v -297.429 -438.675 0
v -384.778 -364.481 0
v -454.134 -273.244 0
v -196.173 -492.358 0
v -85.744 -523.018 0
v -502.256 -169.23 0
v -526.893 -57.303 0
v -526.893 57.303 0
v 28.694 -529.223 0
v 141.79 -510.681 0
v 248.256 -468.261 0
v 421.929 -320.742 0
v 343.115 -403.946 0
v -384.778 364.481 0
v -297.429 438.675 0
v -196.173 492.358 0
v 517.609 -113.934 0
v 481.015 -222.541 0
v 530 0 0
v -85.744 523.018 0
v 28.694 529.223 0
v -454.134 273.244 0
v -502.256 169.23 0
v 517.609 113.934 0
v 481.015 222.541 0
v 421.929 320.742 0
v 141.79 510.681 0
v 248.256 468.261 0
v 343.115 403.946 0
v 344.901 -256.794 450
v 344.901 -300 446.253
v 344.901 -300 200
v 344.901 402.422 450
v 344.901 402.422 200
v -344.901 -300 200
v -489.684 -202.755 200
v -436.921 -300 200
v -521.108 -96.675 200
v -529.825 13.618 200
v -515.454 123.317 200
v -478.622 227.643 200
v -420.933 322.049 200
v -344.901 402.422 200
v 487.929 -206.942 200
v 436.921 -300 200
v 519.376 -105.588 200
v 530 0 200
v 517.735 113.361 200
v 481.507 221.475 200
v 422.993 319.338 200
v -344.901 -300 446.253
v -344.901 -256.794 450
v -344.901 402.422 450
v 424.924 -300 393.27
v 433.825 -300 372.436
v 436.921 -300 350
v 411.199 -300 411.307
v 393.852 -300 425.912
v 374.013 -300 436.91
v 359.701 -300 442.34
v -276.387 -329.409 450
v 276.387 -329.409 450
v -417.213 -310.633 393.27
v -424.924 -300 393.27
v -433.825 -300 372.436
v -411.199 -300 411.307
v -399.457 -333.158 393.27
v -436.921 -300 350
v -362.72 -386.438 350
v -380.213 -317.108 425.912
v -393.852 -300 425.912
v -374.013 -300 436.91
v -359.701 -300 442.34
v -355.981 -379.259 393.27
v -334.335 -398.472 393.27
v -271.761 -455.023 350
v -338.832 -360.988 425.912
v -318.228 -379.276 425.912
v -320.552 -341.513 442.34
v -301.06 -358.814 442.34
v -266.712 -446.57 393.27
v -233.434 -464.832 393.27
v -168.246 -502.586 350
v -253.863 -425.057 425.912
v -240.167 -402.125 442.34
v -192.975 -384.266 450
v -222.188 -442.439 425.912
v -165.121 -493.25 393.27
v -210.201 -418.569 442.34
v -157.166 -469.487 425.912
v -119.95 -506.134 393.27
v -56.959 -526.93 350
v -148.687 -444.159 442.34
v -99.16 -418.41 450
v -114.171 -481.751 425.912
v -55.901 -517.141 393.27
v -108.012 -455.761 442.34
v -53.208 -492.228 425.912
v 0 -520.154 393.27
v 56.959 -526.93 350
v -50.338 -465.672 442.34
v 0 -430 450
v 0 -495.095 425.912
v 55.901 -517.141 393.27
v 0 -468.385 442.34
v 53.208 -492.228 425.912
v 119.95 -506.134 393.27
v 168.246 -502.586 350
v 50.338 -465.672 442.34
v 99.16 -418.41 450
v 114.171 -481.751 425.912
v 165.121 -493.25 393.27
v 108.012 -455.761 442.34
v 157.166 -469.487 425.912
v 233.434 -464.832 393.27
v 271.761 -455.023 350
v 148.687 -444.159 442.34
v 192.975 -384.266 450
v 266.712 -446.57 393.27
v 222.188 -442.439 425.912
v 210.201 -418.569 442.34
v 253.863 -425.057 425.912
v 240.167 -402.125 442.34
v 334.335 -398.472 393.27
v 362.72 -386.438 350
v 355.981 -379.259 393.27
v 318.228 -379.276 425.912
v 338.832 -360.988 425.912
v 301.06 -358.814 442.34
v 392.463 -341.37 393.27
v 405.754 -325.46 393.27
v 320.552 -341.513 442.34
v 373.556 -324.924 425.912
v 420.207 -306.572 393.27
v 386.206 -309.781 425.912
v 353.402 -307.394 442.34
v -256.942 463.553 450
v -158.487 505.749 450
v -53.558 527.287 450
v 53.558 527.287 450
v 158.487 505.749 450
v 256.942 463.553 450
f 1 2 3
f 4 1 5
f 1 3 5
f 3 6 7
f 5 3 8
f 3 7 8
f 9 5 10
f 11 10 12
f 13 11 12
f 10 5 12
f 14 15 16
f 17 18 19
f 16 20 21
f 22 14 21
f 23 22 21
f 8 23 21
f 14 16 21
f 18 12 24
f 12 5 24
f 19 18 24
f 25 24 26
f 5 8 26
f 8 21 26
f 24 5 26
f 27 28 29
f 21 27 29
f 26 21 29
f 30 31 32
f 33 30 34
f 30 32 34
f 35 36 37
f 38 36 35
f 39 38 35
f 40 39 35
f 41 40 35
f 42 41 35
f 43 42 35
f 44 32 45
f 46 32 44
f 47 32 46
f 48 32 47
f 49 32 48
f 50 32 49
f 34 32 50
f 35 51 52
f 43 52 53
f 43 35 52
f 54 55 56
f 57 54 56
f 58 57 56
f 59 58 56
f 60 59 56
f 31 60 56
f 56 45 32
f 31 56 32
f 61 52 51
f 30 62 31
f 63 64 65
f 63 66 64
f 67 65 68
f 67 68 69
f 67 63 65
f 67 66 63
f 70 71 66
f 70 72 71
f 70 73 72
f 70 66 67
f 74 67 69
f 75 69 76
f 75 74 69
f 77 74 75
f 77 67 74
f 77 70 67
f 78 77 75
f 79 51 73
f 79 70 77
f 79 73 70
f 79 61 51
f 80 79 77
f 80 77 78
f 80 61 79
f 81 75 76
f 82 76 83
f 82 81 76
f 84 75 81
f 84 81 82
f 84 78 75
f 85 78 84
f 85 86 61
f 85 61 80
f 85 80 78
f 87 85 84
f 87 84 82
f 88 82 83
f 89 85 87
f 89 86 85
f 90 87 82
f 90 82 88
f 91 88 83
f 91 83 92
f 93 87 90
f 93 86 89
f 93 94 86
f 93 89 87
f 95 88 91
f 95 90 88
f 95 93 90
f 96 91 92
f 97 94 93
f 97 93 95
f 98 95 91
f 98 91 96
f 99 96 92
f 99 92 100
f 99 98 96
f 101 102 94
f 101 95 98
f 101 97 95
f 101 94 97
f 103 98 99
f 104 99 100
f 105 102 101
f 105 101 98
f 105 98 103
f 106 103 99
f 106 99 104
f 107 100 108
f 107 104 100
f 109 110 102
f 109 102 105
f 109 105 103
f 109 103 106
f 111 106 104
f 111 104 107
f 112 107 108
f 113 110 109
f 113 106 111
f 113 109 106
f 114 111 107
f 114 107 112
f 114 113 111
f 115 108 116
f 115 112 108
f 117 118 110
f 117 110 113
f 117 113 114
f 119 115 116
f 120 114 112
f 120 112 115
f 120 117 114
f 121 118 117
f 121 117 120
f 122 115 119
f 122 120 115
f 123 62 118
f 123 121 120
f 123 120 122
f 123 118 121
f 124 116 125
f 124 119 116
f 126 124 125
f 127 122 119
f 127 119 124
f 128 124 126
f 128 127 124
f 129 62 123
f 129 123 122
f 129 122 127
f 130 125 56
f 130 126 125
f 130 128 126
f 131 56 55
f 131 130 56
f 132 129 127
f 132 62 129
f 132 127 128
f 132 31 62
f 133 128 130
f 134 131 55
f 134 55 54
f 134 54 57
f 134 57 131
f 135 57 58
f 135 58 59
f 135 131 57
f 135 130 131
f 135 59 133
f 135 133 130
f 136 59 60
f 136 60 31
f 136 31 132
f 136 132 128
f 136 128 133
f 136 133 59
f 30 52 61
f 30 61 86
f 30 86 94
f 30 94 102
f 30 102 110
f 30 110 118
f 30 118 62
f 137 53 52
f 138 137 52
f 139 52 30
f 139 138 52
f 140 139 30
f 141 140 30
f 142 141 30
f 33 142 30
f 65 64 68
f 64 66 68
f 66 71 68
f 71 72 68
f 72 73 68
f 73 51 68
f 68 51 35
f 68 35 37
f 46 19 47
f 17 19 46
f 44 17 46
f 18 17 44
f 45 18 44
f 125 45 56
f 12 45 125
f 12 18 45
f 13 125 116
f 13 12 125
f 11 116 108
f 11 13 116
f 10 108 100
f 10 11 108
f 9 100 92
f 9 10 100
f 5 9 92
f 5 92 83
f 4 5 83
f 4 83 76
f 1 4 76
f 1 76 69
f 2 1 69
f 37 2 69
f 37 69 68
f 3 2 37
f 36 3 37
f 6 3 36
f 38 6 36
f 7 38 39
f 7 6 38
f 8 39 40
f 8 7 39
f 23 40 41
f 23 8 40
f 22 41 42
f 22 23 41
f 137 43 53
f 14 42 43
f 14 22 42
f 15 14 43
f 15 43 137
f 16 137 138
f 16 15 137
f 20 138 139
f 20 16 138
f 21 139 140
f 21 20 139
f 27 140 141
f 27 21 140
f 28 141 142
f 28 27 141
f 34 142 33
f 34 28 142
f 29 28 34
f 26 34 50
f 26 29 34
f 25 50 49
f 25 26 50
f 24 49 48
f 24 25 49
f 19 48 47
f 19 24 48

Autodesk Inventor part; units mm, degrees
ref_plane "YZ Plane" through (0, 0, 0) normal (1, 0, 0) x (0, 1, 0)
ref_plane "XZ Plane" through (0, 0, 0) normal (0, 1, 0) x (-1, 0, 0)
ref_plane "XY Plane" through (0, 0, 0) normal (0, 0, 1) x (1, 0, 0)
sketch "Sketch1" plane through (0, 0, 0) normal (0, 0, 1) x (1, 0, 0)
  circle A0 centre (0, 0) radius 530
  dimension "d0" = 1060
extrude "Extrusion1" add sketch "Sketch1" along normal blind 200
sketch "Sketch2" plane through (0, 0, 200) normal (0, 0, 1) x (1, 0, 0)
  circle A0 centre (0, 0) radius 530 projected
  line L0 (0, 0) -> (0, -300) construction
  line L1 (436.921, -300) -> (-436.921, -300)
  line L2 (-344.9012, -300) -> (-344.9012, 402.4216)
  line L3 (344.9012, -300) -> (344.9012, 402.4216)
  dimension "d3" = 300
  dimension "d5" = 873.8421
  dimension "d14" = 344.9012
extrude "Extrusion2" add sketch "Sketch2" along normal blind 250 contours L3 L1 L2 A0 | A0 L1
fillet "Fillet1" radius 100 1 edges at (0, -530, 450)
equation "\"d6\" = d9"
equation "\"d9\" = 250"
properties part number "02_DoF1_Podstawa"
